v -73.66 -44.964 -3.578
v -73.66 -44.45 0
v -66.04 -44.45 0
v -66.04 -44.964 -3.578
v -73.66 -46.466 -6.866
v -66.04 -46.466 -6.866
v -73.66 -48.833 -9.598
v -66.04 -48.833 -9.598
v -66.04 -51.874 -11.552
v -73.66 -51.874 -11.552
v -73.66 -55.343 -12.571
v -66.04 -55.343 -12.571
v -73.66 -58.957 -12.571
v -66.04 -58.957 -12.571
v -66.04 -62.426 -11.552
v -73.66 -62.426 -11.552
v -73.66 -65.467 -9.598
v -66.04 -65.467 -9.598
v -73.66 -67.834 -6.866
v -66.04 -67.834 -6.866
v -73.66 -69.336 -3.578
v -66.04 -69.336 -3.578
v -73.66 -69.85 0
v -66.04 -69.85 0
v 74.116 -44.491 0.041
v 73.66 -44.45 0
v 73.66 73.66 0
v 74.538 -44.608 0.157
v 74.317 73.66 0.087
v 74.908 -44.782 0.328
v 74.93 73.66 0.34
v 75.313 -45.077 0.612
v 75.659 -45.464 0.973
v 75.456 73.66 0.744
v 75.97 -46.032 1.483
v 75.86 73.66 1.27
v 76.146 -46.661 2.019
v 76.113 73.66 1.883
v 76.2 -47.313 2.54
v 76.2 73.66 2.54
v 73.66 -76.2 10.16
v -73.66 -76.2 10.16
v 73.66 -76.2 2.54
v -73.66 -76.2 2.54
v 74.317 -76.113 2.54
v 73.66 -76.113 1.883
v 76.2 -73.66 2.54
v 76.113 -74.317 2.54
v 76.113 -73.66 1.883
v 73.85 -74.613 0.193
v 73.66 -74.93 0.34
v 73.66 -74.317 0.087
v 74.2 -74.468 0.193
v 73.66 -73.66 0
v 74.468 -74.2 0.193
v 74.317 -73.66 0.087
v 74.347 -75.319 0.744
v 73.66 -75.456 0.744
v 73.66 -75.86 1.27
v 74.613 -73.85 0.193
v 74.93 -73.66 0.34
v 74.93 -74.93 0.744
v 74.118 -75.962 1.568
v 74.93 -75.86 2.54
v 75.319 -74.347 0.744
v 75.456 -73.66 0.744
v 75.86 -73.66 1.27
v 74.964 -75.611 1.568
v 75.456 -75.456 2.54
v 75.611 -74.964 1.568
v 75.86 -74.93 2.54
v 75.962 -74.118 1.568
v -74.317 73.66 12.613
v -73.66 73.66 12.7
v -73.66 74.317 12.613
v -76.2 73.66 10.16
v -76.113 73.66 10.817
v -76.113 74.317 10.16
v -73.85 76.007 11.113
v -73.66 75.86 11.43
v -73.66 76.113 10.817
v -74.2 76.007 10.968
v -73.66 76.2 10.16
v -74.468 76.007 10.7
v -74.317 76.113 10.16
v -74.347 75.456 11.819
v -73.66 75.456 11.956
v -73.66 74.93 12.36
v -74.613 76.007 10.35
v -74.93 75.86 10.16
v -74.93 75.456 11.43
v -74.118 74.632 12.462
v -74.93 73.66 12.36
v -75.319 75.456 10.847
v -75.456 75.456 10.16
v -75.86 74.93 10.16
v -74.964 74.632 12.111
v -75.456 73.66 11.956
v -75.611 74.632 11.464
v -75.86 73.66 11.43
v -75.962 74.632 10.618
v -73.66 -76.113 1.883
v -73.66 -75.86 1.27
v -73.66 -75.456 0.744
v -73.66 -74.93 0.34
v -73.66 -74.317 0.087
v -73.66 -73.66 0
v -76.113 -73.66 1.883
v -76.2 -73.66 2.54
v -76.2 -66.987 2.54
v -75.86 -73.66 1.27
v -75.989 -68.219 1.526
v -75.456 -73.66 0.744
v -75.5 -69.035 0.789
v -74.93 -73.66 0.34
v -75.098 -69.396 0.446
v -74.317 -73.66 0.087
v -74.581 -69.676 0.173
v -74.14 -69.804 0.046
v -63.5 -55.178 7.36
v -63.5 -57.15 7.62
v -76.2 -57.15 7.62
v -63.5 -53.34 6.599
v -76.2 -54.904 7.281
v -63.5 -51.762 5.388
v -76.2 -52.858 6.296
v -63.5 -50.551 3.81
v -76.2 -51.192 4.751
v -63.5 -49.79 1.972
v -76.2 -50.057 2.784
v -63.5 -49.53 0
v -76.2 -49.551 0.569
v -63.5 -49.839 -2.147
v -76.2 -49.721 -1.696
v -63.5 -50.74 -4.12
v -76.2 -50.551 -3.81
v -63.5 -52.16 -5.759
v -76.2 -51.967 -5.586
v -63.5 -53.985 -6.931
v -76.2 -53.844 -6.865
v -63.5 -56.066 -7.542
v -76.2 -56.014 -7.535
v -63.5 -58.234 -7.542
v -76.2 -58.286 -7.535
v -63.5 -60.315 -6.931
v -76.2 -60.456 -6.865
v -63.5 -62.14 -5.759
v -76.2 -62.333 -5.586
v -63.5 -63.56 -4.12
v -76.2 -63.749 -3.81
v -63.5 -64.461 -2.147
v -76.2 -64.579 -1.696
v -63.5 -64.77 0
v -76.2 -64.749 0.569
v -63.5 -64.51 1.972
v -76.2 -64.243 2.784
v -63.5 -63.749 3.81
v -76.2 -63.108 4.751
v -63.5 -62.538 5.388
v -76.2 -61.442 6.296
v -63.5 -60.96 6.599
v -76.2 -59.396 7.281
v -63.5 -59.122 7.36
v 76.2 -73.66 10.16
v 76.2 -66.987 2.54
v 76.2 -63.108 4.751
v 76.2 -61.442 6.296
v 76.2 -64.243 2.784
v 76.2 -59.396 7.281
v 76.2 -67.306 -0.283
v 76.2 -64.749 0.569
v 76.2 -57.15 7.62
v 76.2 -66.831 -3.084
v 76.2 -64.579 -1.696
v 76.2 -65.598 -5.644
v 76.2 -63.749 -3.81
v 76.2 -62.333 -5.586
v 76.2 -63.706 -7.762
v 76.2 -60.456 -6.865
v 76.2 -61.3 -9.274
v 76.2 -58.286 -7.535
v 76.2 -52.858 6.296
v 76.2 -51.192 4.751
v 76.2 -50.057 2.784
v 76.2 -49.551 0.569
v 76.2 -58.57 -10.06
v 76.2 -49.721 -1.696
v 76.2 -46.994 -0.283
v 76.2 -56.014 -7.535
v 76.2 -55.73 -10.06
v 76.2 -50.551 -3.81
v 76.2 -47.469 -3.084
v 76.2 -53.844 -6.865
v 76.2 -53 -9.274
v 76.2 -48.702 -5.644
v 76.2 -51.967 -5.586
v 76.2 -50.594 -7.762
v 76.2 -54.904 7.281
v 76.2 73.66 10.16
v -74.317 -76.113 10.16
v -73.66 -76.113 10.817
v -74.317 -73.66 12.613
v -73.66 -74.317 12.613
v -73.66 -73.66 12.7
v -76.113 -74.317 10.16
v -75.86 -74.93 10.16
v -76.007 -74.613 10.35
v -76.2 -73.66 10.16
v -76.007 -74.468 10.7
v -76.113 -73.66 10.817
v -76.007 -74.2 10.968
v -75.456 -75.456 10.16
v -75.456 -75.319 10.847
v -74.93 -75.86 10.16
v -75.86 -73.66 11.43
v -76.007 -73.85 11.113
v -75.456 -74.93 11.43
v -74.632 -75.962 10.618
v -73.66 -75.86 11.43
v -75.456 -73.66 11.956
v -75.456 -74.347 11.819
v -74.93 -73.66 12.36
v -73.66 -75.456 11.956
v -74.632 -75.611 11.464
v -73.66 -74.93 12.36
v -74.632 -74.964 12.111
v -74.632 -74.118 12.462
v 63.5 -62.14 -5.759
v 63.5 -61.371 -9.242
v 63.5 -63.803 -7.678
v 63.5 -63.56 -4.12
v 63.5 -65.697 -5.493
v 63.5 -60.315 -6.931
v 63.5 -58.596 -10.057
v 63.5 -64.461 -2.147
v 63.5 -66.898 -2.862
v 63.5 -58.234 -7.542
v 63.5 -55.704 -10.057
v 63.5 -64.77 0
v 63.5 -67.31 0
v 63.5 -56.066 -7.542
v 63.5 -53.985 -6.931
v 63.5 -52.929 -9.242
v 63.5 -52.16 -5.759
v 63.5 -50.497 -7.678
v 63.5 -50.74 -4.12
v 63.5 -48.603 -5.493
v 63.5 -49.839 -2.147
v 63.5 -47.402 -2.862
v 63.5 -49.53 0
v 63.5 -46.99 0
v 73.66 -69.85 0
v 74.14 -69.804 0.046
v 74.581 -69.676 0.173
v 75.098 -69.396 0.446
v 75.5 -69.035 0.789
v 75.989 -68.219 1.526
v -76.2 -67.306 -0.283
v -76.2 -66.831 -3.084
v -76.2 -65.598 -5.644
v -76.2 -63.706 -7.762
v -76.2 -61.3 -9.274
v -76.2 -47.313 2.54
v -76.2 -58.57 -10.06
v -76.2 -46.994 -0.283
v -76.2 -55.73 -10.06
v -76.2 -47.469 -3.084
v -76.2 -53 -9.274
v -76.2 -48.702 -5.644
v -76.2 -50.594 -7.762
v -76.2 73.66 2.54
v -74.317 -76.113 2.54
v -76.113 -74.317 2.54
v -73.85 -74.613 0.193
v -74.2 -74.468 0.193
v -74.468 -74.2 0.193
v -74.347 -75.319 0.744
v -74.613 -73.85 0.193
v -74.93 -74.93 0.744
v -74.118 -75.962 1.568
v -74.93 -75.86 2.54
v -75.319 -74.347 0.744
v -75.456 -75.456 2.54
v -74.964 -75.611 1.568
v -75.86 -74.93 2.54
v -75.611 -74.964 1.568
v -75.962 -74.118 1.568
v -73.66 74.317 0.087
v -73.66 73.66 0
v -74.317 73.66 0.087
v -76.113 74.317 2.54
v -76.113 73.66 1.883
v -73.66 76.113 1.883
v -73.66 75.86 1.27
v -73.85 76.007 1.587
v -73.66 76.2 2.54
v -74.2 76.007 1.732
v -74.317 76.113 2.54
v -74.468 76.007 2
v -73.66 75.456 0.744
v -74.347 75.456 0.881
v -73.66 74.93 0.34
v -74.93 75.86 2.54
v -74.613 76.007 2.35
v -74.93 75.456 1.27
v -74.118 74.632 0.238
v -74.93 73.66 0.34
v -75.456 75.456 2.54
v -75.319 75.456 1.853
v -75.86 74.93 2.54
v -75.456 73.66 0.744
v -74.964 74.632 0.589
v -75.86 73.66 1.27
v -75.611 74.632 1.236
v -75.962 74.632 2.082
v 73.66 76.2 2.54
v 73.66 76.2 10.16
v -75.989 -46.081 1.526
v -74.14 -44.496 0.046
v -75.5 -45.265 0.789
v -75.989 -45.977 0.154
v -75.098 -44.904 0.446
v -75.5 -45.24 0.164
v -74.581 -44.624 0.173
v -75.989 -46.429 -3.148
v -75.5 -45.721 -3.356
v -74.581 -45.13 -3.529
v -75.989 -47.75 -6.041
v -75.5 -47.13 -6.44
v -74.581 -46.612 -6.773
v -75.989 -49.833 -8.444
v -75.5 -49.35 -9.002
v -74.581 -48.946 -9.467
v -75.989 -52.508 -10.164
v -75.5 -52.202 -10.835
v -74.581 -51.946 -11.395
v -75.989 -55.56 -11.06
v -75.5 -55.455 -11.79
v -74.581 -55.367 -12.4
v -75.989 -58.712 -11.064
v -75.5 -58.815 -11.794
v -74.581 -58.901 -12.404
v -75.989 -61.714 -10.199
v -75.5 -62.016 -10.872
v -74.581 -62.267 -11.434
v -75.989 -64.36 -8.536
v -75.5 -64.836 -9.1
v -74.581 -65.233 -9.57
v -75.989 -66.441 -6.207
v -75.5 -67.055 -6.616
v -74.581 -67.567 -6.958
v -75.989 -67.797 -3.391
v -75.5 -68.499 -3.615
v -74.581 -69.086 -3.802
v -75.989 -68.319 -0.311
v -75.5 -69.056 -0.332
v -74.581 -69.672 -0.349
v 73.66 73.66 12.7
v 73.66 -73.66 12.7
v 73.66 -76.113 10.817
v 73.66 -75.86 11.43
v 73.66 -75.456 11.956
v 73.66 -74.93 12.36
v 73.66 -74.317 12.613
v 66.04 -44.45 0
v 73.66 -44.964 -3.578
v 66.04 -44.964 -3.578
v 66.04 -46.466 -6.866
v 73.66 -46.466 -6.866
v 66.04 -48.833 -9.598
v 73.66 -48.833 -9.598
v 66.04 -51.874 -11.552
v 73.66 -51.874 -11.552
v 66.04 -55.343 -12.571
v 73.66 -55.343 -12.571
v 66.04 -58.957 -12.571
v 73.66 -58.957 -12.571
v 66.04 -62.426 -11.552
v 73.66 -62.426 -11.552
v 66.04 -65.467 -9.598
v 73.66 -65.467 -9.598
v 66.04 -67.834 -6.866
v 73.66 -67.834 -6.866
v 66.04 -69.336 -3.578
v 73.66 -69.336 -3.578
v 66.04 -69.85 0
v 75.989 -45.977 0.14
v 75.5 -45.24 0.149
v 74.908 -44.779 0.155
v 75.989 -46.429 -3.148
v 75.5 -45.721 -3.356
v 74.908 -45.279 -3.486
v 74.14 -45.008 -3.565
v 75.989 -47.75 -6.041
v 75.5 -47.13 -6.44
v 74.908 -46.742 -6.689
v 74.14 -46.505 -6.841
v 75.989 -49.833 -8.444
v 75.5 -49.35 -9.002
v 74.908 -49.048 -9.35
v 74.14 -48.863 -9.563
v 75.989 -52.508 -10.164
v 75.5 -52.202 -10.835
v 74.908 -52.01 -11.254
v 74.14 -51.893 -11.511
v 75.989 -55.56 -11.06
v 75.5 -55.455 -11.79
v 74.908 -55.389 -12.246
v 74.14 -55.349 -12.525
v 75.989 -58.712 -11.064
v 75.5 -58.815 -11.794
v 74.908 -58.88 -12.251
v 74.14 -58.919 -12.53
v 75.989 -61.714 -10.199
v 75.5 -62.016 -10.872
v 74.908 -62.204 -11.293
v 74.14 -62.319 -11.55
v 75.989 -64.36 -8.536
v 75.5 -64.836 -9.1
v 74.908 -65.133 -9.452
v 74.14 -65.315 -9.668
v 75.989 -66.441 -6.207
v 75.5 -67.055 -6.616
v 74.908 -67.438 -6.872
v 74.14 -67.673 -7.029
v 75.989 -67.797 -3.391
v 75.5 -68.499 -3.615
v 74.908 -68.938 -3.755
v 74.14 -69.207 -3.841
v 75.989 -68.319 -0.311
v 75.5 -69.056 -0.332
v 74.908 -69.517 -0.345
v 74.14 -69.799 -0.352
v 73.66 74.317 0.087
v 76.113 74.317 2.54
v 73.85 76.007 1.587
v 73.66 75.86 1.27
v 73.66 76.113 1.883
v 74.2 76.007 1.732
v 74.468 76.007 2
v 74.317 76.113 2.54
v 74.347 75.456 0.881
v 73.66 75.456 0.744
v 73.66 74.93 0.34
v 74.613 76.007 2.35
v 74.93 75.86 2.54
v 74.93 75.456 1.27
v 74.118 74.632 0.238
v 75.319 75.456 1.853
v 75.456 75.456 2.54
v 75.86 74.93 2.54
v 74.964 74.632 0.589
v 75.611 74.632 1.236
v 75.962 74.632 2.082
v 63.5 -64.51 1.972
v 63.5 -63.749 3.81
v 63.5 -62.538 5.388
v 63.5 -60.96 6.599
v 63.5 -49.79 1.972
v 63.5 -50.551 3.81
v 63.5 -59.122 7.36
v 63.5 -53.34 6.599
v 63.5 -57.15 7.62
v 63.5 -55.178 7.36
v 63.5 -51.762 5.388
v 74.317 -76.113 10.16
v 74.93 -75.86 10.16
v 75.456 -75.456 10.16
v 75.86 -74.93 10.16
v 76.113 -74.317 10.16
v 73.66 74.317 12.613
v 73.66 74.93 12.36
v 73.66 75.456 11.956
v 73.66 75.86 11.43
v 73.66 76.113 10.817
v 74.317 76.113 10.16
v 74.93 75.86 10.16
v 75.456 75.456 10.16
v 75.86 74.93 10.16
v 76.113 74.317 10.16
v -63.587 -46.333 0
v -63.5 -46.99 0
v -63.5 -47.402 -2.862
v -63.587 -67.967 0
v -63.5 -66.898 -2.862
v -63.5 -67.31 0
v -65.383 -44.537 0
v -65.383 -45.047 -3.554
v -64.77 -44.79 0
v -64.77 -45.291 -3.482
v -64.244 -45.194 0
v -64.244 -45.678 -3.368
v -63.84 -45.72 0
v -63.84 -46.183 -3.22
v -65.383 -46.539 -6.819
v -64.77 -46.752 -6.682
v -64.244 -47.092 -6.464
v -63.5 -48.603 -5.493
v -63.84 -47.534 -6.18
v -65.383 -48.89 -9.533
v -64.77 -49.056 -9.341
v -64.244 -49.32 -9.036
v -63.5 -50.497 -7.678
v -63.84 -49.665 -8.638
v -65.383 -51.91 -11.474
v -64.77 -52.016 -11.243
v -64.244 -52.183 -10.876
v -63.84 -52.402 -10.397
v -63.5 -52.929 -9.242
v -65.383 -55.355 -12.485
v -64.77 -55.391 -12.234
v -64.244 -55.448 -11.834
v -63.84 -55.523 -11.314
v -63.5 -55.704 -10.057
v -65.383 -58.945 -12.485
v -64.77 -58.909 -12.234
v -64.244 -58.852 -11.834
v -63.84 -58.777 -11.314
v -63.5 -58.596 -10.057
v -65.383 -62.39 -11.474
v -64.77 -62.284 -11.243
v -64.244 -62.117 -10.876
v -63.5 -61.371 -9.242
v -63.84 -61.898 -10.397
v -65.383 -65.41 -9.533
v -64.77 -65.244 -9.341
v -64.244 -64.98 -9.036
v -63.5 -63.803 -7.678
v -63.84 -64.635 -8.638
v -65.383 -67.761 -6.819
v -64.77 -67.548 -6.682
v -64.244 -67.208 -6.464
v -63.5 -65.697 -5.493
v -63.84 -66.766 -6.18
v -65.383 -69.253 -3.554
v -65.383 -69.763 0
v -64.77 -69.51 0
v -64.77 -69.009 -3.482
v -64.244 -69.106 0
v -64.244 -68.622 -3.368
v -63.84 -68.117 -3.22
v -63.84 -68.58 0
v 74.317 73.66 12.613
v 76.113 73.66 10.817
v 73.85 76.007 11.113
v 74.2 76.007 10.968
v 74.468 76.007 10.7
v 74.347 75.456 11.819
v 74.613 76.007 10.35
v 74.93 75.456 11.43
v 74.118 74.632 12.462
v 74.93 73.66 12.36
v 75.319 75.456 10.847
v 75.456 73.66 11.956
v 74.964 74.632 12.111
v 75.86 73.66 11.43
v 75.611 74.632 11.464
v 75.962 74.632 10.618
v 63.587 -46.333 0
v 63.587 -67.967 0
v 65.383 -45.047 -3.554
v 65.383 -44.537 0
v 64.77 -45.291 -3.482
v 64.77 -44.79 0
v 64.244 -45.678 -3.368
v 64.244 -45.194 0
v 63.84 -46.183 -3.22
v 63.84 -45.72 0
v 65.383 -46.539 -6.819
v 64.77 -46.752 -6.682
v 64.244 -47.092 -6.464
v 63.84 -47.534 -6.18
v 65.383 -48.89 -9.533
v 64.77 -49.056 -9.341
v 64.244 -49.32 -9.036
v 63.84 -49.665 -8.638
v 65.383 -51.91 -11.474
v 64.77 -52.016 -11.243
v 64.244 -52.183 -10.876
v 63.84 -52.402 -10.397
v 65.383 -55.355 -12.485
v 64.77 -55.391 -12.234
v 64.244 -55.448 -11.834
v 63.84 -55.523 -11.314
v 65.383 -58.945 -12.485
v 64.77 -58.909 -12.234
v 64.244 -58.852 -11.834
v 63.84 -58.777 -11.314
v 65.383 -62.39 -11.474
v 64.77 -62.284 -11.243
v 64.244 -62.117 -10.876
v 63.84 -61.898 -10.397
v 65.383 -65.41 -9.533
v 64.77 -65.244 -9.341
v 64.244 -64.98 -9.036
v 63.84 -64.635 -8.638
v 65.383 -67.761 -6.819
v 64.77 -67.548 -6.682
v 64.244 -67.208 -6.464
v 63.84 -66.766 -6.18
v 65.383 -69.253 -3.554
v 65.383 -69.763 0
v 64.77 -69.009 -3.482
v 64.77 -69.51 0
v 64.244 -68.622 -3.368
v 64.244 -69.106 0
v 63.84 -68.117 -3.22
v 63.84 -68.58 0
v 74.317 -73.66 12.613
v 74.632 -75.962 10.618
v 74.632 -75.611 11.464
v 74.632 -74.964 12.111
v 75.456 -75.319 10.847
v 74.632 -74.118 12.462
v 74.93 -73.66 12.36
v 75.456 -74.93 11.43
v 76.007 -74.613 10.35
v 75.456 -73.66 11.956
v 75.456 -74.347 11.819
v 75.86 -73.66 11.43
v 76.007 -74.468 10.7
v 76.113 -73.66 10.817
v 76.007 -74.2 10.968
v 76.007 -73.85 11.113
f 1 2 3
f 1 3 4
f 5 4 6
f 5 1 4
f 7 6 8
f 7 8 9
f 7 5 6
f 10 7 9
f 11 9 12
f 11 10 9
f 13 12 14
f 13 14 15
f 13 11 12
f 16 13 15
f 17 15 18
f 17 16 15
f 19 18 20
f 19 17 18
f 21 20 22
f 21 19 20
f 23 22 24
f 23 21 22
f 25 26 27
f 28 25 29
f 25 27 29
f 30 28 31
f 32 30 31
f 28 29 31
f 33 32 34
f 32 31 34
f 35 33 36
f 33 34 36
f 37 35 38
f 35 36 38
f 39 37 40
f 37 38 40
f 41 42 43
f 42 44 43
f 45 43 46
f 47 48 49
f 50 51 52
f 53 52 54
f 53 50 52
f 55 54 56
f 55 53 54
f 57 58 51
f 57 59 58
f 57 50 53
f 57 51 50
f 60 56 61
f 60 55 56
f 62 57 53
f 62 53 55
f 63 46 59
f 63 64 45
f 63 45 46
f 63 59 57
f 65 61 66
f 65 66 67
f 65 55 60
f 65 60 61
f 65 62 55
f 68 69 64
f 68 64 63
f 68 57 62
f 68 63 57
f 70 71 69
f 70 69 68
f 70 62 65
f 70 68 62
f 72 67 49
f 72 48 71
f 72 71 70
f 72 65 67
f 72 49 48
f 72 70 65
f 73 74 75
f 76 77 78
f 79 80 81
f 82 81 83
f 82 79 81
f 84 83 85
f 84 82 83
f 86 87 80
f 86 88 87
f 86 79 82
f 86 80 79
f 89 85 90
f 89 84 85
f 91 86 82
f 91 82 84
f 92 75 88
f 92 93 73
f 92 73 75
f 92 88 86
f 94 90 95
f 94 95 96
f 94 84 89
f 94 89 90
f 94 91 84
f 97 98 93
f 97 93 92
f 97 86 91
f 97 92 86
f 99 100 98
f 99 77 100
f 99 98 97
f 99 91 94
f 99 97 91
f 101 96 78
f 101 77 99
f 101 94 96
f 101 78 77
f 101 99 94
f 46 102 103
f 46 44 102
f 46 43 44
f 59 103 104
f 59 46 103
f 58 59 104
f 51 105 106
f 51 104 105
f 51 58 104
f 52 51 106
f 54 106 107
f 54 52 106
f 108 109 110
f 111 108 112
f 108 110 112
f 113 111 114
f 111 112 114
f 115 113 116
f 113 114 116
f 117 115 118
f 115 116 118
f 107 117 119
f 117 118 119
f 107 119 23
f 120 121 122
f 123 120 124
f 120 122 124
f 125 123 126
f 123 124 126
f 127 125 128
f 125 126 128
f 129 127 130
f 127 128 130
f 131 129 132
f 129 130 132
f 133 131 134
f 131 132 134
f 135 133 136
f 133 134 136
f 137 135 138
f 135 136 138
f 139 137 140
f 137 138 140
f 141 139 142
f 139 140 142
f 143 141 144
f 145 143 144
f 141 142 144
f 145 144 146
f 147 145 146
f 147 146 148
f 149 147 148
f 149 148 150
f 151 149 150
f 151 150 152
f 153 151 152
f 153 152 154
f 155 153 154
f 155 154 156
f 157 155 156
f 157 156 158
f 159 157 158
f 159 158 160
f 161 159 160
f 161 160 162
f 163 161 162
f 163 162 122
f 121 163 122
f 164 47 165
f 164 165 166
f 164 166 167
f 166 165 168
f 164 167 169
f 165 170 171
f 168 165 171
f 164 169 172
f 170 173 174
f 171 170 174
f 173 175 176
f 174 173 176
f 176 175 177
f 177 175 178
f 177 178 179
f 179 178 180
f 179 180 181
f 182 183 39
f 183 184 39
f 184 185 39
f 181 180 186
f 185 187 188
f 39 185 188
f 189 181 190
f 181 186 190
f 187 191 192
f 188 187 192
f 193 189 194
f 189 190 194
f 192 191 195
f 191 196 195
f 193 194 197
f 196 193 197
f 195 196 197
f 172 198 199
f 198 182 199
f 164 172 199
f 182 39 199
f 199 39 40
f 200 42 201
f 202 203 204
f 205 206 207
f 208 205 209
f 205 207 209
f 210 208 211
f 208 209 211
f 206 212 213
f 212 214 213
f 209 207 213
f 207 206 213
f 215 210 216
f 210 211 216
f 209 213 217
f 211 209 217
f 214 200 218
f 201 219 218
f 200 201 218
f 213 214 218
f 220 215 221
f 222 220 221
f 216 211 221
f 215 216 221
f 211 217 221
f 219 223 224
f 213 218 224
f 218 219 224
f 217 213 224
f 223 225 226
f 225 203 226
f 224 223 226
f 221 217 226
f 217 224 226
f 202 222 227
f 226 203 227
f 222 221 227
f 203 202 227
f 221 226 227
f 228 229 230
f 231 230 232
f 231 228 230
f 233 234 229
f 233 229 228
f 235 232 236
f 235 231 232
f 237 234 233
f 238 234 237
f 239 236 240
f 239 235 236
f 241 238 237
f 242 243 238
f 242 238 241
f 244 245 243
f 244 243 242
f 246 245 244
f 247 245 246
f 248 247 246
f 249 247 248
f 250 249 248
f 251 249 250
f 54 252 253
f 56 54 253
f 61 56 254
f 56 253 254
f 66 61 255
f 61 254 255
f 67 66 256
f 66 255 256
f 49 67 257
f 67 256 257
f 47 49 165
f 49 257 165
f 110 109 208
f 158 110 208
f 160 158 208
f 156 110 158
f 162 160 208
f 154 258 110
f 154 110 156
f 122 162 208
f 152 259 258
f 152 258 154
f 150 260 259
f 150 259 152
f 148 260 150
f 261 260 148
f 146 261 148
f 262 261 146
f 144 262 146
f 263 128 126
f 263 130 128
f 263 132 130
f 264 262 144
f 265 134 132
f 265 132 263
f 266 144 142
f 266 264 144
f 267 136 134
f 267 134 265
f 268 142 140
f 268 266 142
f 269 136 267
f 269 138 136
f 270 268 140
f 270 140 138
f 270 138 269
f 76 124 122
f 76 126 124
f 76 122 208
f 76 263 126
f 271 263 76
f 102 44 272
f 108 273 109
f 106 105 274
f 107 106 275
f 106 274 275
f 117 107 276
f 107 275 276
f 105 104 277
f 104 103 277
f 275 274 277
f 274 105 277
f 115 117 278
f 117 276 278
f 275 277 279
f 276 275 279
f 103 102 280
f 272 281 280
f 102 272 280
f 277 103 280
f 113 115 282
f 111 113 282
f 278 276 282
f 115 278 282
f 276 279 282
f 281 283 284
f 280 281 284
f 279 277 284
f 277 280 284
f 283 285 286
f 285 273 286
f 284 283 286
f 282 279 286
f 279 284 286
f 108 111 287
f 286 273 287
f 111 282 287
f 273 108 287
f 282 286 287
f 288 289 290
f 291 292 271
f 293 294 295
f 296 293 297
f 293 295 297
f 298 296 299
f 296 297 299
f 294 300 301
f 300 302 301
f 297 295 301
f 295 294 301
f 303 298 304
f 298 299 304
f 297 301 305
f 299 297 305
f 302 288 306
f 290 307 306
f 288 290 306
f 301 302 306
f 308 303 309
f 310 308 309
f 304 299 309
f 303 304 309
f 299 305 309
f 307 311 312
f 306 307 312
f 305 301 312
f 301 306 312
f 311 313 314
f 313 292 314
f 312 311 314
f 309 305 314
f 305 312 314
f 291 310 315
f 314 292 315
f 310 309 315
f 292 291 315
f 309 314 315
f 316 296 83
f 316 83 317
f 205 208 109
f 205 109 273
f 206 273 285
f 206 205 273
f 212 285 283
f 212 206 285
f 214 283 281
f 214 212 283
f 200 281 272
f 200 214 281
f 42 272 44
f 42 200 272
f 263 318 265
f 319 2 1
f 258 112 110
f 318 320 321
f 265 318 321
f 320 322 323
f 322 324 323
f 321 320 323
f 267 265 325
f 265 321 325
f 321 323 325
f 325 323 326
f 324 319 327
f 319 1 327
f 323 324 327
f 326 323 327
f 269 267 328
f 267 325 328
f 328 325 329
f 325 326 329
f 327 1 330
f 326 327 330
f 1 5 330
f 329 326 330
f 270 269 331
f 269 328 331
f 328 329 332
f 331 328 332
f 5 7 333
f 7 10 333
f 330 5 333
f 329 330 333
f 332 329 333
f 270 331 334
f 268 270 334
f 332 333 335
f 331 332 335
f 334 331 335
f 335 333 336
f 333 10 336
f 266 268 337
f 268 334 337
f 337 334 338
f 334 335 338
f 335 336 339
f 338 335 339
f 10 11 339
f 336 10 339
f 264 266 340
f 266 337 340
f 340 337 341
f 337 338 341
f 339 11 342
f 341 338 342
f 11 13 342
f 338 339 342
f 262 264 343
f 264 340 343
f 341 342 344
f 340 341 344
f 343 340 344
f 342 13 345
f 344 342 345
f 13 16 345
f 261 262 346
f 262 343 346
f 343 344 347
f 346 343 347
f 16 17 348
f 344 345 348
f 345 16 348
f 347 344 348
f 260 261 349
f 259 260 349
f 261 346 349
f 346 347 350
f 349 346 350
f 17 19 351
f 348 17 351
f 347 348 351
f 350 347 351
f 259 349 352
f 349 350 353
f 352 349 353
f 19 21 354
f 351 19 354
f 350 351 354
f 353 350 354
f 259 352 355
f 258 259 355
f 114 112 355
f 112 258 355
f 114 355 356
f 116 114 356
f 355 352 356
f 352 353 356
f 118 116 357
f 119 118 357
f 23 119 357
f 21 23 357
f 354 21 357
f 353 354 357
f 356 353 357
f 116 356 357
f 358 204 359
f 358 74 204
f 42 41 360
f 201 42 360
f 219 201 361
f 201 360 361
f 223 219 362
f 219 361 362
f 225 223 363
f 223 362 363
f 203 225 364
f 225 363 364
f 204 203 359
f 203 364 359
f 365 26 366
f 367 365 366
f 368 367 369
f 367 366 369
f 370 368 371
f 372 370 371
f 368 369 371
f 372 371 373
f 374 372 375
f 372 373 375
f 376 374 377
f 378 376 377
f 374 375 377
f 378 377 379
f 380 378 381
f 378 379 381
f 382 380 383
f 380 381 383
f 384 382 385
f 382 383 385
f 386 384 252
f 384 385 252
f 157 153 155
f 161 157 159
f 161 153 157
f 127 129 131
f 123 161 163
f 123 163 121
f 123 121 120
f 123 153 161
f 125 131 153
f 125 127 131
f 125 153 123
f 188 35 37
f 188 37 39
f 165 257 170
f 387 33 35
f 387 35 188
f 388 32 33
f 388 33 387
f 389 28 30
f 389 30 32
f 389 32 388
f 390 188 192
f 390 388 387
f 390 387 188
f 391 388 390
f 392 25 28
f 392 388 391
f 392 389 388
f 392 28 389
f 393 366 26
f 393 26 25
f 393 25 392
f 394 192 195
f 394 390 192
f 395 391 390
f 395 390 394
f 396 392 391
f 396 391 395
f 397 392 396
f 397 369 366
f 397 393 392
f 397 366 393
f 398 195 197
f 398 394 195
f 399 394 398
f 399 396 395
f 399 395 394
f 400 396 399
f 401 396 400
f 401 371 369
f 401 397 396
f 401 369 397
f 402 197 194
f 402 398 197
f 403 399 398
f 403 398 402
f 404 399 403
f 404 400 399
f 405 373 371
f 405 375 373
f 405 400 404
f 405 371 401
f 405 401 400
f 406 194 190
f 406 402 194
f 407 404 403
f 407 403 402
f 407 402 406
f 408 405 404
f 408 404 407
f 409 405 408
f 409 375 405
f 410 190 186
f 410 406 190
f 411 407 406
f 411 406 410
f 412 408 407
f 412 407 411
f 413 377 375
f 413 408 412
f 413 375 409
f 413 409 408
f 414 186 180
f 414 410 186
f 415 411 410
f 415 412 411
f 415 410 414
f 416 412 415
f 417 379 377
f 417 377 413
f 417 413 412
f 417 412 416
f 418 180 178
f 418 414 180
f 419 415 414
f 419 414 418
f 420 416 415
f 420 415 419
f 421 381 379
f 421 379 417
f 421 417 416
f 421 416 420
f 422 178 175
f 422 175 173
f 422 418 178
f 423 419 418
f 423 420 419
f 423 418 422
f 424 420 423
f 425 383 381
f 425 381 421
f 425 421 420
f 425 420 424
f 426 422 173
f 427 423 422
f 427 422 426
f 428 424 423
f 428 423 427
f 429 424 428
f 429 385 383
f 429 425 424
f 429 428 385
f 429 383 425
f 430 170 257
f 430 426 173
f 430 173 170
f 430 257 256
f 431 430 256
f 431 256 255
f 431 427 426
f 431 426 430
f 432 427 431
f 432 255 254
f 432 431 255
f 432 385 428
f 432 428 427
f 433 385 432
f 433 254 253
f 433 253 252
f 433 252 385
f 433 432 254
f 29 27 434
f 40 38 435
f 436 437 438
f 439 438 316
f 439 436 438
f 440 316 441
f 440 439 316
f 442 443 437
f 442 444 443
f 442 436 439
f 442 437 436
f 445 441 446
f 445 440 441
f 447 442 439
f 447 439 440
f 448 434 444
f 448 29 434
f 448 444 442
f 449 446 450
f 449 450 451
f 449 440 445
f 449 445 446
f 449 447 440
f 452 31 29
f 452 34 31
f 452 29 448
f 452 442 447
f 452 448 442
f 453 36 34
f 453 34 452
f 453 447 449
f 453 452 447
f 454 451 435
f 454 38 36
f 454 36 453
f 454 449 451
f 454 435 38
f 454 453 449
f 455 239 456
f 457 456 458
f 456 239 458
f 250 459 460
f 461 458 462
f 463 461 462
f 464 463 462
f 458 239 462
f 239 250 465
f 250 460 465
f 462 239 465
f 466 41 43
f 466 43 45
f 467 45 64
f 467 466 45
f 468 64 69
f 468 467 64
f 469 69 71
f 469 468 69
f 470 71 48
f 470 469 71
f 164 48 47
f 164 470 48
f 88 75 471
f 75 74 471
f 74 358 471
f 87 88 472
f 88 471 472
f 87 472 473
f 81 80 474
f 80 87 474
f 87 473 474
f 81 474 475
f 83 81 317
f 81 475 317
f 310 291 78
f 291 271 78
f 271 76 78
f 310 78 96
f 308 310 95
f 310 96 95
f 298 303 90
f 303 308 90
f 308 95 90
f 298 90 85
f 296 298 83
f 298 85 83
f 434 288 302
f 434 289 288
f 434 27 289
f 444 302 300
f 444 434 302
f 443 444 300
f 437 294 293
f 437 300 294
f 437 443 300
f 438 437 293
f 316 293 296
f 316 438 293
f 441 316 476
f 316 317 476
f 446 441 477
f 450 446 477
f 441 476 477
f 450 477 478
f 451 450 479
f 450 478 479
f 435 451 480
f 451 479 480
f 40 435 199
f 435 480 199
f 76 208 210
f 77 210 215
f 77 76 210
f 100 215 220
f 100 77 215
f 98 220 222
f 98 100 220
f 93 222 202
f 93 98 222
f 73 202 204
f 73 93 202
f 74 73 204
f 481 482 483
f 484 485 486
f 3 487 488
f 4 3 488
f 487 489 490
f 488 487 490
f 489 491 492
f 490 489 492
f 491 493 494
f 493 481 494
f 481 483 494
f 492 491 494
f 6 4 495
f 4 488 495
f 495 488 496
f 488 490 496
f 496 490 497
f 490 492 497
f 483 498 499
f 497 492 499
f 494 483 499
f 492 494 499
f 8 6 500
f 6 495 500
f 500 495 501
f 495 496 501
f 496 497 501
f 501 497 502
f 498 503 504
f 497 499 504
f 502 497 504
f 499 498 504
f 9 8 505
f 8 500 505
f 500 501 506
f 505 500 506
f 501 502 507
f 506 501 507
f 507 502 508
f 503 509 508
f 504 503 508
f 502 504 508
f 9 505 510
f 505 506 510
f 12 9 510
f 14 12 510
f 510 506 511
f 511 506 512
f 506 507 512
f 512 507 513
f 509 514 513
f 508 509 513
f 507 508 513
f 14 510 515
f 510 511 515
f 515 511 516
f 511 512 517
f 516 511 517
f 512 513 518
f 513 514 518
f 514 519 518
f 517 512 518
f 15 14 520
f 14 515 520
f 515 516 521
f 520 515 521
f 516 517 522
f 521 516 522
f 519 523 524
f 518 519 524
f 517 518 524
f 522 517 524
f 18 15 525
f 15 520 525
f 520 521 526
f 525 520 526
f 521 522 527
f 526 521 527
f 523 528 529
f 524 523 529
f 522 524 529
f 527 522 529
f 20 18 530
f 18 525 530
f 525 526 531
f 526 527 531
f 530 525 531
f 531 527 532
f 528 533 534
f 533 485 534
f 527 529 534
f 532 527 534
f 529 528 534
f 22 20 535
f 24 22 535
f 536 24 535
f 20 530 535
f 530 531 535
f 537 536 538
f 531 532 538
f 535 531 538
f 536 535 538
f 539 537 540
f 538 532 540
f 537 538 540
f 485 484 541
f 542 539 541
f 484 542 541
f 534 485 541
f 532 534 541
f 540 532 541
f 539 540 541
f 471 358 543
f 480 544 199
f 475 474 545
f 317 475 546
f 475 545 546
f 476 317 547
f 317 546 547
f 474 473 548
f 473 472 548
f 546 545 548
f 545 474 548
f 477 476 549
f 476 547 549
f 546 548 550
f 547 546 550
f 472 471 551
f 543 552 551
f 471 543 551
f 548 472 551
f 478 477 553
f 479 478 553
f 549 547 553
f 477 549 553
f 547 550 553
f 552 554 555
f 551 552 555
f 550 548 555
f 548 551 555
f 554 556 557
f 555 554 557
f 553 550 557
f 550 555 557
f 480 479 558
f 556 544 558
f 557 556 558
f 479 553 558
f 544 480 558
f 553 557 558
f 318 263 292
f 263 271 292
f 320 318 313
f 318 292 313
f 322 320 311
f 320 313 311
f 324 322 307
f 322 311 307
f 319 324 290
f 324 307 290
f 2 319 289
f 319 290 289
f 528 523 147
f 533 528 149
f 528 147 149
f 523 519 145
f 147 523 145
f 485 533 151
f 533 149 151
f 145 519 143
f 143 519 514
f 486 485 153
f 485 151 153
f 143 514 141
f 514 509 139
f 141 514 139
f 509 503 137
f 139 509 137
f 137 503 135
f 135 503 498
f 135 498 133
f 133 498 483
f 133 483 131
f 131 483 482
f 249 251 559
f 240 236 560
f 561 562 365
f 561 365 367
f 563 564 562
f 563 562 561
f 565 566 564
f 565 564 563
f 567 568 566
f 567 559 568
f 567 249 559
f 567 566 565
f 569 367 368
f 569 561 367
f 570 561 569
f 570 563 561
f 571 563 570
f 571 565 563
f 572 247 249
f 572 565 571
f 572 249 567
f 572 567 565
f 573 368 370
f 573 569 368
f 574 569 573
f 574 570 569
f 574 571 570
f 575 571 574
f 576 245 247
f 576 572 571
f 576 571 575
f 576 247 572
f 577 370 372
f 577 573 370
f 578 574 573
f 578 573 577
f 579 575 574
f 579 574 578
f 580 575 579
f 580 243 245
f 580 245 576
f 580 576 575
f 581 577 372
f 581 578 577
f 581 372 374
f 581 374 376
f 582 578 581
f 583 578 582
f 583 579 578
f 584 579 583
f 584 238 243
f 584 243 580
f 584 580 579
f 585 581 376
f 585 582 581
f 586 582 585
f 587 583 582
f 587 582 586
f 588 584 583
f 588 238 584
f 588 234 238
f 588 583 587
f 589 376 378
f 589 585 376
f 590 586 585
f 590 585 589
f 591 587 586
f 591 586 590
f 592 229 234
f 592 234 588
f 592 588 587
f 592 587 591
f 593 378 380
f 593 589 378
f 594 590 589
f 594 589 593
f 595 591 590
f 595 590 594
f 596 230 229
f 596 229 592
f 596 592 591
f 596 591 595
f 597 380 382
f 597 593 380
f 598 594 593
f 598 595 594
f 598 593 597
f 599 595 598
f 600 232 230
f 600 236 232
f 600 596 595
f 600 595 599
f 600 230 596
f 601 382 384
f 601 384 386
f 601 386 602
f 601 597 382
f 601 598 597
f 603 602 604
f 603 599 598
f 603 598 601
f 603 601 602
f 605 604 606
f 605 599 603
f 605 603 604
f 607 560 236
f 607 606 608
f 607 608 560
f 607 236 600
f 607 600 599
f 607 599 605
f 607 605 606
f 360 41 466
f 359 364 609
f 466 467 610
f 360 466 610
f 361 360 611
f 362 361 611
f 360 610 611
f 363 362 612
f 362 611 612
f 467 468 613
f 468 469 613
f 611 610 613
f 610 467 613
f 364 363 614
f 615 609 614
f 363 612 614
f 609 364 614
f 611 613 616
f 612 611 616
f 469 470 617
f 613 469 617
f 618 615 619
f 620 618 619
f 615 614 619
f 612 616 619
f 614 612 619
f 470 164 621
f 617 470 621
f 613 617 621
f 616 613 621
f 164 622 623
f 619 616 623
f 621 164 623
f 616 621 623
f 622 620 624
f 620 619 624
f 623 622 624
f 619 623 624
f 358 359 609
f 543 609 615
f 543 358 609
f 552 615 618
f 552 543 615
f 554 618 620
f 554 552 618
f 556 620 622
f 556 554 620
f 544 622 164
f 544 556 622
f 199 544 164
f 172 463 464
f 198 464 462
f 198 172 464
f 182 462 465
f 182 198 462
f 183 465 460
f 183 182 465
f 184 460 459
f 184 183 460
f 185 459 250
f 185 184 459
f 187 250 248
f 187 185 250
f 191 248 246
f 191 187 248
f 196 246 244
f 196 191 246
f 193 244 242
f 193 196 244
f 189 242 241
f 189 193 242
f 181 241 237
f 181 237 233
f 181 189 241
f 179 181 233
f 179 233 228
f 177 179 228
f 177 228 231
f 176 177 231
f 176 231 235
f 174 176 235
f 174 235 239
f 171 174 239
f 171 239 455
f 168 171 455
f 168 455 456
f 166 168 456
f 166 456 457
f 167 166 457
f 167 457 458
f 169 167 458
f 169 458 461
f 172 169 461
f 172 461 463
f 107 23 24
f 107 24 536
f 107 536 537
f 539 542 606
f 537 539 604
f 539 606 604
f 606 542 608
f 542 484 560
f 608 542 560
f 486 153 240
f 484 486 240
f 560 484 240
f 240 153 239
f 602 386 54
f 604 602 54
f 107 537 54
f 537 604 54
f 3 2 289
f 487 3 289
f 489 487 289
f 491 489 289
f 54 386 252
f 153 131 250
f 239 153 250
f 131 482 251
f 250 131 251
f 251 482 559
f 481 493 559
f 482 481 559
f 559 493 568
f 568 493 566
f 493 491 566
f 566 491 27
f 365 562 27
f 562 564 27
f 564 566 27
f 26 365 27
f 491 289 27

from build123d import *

# Parameters (mm, degrees)
SKETCH1_W           = 152.4
SKETCH1_H           = 152.4
BOSS_EXTRUDE1_DEPTH = 12.7
BOSS_EXTRUDE2_DEPTH = 12.7
SKETCH2_R           = 7.62
CUT_EXTRUDE1_DEPTH  = 12.7
FILLET1_R           = 2.54
FILLET2_R           = 2.54


with BuildPart() as part:
    # Sketch1 → Boss-Extrude1 (new body)
    with BuildSketch(Plane.XY):
        Rectangle(SKETCH1_W, SKETCH1_H)
    extrude(amount=BOSS_EXTRUDE1_DEPTH)

    # Sketch3 → Boss-Extrude2 (add)
    with BuildSketch(Plane.ZY.offset(76.2)):
        with BuildLine():
            Line((0, -69.85), (0, -44.45))
            ThreePointArc((0, -44.45), (-12.7, -57.15), (0, -69.85))
        make_face()
    boss_extrude2 = extrude(amount=-BOSS_EXTRUDE2_DEPTH)

    # Sketch2 → Cut-Extrude1 (cut)
    with BuildSketch(Plane.ZY.offset(76.2)):
        with Locations((0, -57.15)):
            Circle(SKETCH2_R)
    cut_extrude1 = extrude(amount=-CUT_EXTRUDE1_DEPTH, mode=Mode.SUBTRACT)

    # Mirror1: Boss-Extrude2, Cut-Extrude1 across plane
    add(boss_extrude2.mirror(Plane(origin=(0, 0, 0), x_dir=(0, 0, 1), z_dir=(1, 0, 0))))
    add(cut_extrude1.mirror(Plane(origin=(0, 0, 0), x_dir=(0, 0, 1), z_dir=(1, 0, 0))), mode=Mode.SUBTRACT)

    # Fillet1
    fillet1_edges = [part.edges().sort_by_distance(p)[0] for p in [
        (0, -76.2, 12.7),
    ]]
    fillet(fillet1_edges, radius=FILLET1_R)

    # Fillet2
    fillet2_edges = [part.edges().sort_by_distance(p)[0] for p in [
        (-76.2, 15.875, 0),
        (-76.2, -57.15, -12.7),
        (-63.5, -57.15, -12.7),
        (76.2, 15.875, 0),
        (63.5, -57.15, -12.7),
        (76.2, -57.15, -12.7),
        (-76.2, 1.27, 12.7),
        (76.2, 1.27, 12.7),
        (76.2, -76.2, 5.08),
        (76.2, -75.456051224, 11.956051224),
        (0, -76.2, 0),
        (-76.2, -76.2, 5.08),
        (-76.2, -75.456051224, 11.956051224),
        (76.2, -73.025, 0),
        (0, 76.2, 0),
        (-76.2, -73.025, 0),
        (0, 76.2, 12.7),
        (76.2, 76.2, 6.35),
        (-76.2, 76.2, 6.35),
    ]]
    fillet(fillet2_edges, radius=FILLET2_R)


solid = part.part
